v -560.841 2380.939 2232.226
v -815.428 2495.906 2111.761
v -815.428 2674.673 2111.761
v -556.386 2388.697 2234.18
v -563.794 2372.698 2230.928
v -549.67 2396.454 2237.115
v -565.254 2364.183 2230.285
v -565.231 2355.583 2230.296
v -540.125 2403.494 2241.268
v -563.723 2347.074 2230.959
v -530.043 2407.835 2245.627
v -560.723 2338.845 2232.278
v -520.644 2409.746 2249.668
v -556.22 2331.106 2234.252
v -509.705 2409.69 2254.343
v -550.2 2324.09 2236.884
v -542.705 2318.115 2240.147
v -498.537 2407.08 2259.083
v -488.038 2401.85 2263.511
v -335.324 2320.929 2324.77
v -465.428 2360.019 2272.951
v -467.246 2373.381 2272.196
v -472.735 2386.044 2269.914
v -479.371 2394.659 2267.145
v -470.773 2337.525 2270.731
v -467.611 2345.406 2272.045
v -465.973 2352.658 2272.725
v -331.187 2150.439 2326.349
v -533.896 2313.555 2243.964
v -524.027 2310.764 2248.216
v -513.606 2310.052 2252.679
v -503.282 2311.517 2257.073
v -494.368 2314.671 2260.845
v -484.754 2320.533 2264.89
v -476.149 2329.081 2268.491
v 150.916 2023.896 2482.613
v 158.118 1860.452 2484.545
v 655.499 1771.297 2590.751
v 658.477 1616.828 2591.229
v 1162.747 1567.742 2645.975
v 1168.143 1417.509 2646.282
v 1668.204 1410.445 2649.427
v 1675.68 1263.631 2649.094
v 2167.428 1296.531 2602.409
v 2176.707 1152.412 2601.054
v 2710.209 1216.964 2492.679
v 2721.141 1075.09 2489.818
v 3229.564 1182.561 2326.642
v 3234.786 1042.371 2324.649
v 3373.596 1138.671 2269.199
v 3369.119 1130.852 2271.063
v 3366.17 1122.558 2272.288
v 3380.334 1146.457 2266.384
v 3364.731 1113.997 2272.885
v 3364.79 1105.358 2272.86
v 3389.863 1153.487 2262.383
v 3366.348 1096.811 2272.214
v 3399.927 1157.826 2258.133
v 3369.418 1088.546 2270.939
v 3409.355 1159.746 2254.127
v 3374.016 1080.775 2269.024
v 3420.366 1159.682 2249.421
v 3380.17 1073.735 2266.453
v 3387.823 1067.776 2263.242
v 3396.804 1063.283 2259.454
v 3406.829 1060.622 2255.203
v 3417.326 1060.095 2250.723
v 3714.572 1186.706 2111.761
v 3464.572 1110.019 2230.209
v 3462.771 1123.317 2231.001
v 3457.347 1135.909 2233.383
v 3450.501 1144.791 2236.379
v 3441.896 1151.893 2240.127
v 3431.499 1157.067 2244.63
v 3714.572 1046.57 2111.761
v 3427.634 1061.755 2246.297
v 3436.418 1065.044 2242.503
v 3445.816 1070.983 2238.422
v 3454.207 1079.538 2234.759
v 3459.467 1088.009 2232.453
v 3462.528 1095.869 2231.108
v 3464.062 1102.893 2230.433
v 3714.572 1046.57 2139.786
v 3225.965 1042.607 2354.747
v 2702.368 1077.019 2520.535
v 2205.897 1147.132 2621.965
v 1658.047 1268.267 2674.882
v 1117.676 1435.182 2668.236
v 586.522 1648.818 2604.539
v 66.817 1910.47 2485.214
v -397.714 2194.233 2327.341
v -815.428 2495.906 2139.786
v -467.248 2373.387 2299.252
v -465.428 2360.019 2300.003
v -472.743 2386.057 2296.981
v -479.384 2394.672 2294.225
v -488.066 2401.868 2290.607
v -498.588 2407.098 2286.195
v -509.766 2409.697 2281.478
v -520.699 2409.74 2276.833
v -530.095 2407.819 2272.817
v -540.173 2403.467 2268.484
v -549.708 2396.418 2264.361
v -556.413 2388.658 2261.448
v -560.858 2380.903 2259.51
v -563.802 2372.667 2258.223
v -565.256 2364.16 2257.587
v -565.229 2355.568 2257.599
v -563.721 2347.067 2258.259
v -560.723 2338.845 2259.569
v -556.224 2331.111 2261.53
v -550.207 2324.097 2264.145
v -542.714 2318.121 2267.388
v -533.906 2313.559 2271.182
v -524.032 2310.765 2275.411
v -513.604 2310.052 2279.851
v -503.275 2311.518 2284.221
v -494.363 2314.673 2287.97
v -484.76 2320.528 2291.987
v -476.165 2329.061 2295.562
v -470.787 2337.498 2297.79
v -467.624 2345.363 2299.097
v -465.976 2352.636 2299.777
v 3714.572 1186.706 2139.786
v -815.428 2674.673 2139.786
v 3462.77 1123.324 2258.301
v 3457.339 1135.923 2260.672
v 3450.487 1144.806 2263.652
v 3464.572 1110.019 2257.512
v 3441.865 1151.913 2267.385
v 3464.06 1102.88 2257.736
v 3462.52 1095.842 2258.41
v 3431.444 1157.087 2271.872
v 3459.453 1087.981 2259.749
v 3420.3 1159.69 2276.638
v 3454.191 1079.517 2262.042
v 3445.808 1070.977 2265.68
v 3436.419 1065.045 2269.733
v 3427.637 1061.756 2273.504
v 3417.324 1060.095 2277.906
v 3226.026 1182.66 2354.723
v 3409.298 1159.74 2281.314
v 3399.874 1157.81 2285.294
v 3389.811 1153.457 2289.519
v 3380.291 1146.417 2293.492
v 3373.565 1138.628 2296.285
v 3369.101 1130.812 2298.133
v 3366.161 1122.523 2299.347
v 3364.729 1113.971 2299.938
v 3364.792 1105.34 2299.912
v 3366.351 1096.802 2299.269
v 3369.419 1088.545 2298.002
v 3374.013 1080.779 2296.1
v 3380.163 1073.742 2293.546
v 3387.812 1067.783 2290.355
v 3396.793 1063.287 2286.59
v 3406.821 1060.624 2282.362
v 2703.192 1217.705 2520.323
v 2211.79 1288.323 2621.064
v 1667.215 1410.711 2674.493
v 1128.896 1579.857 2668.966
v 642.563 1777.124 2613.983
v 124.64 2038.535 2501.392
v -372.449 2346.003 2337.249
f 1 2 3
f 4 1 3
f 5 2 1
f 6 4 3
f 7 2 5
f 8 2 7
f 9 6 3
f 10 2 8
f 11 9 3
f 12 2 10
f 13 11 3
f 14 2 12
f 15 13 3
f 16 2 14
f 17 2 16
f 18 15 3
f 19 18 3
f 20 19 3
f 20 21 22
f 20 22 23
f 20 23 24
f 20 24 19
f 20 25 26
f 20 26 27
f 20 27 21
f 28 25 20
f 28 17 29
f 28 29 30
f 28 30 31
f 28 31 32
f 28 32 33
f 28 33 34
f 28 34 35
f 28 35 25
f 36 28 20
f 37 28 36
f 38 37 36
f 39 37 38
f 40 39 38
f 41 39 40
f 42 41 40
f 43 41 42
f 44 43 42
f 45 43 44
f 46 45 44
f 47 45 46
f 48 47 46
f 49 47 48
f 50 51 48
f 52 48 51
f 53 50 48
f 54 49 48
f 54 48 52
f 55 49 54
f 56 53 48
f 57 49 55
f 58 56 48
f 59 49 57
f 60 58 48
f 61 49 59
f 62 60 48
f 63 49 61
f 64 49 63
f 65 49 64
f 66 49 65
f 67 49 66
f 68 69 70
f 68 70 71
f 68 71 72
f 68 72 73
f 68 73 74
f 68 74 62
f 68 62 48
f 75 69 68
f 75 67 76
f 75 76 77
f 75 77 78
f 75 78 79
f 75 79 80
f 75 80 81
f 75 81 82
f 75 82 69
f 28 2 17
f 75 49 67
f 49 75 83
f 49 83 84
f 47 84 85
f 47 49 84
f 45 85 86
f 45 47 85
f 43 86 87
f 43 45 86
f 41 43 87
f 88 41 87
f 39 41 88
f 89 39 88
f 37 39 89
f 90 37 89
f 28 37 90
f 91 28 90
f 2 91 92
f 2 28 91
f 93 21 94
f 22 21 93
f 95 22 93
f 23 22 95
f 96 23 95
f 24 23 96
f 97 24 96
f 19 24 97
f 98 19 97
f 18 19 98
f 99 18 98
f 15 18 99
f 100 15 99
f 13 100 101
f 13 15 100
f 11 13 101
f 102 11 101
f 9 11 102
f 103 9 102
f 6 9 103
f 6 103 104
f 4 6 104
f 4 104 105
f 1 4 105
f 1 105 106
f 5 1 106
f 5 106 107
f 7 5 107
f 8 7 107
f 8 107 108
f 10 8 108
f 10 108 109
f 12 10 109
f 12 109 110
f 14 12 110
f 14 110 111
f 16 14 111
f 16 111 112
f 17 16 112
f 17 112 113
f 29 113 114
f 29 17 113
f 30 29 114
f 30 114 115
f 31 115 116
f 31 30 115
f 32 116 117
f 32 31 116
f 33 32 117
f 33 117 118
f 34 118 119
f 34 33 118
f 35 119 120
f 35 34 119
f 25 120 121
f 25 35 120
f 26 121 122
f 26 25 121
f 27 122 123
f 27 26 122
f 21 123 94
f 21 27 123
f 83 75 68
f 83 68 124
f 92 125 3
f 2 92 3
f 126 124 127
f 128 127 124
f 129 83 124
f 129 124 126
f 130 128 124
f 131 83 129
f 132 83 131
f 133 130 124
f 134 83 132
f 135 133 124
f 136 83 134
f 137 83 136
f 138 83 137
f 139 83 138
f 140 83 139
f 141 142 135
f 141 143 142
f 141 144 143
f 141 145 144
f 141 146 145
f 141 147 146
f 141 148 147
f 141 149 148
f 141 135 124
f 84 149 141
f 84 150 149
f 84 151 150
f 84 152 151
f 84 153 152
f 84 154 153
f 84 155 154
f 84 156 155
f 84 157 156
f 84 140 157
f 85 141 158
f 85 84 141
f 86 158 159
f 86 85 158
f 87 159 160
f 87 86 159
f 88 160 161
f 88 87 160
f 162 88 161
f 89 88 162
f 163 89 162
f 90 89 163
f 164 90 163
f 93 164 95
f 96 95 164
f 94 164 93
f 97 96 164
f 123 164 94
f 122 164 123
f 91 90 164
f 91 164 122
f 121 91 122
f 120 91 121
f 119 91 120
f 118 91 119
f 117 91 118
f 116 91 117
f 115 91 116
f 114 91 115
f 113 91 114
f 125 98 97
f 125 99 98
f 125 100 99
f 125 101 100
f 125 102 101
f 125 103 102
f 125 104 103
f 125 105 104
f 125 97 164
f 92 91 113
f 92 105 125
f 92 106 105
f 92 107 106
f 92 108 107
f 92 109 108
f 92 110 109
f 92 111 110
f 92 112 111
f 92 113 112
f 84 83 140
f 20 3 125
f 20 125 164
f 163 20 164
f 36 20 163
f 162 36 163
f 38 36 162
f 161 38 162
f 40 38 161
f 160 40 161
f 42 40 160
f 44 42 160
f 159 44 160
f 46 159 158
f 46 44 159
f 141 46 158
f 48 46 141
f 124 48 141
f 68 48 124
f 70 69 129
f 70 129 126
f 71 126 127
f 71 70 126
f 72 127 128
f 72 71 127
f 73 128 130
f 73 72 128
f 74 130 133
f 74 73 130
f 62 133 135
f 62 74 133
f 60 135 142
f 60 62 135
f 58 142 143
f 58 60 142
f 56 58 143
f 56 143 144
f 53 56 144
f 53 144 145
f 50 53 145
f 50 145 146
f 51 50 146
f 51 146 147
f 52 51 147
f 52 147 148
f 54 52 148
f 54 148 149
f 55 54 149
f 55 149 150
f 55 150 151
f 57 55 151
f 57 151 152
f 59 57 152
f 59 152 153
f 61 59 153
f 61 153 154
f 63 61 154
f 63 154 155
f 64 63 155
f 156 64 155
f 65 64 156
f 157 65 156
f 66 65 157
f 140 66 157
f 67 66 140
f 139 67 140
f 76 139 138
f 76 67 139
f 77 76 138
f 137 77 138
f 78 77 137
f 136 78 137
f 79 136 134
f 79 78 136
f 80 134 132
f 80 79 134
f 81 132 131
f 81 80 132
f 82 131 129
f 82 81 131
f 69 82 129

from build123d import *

# Parameters (mm, degrees)
BOSS_EXTRUDE1_DEPTH = 3000
SKETCH3_OUTSIDE_W   = 5624.574
SKETCH3_OUTSIDE_H   = 4094.574
SKETCH3_OUTSIDE_R   = 50
CUT_EXTRUDE1_DEPTH  = 3000


with BuildPart() as part:
    # Sketch2 → Boss-Extrude1 (new body)
    with BuildSketch(Plane(origin=(0, 0, 0), x_dir=(1, 0, 0), z_dir=(0, 1, 0))):
        with BuildLine():
            Line((3714.57215032, -2111.76142974), (3714.57215032, -2139.785736105))
            ThreePointArc((3714.57215032, -2139.785736105), (1449.57215032, -2679.208850129), (-815.42784968, -2139.785736105))
            Line((-815.42784968, -2139.785736105), (-815.42784968, -2111.76142974))
            ThreePointArc((-815.42784968, -2111.76142974), (1449.57215032, -2654.208850129), (3714.57215032, -2111.76142974))
        make_face()
    extrude(amount=BOSS_EXTRUDE1_DEPTH)

    # Sketch3 outside → Cut-Extrude1 (cut)
    with BuildSketch(Plane.XY):
        with Locations((1449.572, 1500)):
            Rectangle(SKETCH3_OUTSIDE_W, SKETCH3_OUTSIDE_H)
        with BuildLine():
            Line((-815.42784968, 2495.906119987), (-815.42784968, 2674.67299459))
            ThreePointArc((-815.42784968, 2674.67299459), (1313.444712633, 1516.260061816), (3714.57215032, 1186.705912429))
            Line((3714.57215032, 1186.705912429), (3714.57215032, 1046.569571941))
            ThreePointArc((3714.57215032, 1046.569571941), (1320.206110828, 1366.895486913), (-815.42784968, 2495.906119987))
        make_face(mode=Mode.SUBTRACT)
        with Locations((-515.42784968, 2360.019053002)):
            Circle(SKETCH3_OUTSIDE_R)
        with Locations((3414.57215032, 1110.019053002)):
            Circle(SKETCH3_OUTSIDE_R)
    extrude(amount=CUT_EXTRUDE1_DEPTH, mode=Mode.SUBTRACT)


solid = part.part
